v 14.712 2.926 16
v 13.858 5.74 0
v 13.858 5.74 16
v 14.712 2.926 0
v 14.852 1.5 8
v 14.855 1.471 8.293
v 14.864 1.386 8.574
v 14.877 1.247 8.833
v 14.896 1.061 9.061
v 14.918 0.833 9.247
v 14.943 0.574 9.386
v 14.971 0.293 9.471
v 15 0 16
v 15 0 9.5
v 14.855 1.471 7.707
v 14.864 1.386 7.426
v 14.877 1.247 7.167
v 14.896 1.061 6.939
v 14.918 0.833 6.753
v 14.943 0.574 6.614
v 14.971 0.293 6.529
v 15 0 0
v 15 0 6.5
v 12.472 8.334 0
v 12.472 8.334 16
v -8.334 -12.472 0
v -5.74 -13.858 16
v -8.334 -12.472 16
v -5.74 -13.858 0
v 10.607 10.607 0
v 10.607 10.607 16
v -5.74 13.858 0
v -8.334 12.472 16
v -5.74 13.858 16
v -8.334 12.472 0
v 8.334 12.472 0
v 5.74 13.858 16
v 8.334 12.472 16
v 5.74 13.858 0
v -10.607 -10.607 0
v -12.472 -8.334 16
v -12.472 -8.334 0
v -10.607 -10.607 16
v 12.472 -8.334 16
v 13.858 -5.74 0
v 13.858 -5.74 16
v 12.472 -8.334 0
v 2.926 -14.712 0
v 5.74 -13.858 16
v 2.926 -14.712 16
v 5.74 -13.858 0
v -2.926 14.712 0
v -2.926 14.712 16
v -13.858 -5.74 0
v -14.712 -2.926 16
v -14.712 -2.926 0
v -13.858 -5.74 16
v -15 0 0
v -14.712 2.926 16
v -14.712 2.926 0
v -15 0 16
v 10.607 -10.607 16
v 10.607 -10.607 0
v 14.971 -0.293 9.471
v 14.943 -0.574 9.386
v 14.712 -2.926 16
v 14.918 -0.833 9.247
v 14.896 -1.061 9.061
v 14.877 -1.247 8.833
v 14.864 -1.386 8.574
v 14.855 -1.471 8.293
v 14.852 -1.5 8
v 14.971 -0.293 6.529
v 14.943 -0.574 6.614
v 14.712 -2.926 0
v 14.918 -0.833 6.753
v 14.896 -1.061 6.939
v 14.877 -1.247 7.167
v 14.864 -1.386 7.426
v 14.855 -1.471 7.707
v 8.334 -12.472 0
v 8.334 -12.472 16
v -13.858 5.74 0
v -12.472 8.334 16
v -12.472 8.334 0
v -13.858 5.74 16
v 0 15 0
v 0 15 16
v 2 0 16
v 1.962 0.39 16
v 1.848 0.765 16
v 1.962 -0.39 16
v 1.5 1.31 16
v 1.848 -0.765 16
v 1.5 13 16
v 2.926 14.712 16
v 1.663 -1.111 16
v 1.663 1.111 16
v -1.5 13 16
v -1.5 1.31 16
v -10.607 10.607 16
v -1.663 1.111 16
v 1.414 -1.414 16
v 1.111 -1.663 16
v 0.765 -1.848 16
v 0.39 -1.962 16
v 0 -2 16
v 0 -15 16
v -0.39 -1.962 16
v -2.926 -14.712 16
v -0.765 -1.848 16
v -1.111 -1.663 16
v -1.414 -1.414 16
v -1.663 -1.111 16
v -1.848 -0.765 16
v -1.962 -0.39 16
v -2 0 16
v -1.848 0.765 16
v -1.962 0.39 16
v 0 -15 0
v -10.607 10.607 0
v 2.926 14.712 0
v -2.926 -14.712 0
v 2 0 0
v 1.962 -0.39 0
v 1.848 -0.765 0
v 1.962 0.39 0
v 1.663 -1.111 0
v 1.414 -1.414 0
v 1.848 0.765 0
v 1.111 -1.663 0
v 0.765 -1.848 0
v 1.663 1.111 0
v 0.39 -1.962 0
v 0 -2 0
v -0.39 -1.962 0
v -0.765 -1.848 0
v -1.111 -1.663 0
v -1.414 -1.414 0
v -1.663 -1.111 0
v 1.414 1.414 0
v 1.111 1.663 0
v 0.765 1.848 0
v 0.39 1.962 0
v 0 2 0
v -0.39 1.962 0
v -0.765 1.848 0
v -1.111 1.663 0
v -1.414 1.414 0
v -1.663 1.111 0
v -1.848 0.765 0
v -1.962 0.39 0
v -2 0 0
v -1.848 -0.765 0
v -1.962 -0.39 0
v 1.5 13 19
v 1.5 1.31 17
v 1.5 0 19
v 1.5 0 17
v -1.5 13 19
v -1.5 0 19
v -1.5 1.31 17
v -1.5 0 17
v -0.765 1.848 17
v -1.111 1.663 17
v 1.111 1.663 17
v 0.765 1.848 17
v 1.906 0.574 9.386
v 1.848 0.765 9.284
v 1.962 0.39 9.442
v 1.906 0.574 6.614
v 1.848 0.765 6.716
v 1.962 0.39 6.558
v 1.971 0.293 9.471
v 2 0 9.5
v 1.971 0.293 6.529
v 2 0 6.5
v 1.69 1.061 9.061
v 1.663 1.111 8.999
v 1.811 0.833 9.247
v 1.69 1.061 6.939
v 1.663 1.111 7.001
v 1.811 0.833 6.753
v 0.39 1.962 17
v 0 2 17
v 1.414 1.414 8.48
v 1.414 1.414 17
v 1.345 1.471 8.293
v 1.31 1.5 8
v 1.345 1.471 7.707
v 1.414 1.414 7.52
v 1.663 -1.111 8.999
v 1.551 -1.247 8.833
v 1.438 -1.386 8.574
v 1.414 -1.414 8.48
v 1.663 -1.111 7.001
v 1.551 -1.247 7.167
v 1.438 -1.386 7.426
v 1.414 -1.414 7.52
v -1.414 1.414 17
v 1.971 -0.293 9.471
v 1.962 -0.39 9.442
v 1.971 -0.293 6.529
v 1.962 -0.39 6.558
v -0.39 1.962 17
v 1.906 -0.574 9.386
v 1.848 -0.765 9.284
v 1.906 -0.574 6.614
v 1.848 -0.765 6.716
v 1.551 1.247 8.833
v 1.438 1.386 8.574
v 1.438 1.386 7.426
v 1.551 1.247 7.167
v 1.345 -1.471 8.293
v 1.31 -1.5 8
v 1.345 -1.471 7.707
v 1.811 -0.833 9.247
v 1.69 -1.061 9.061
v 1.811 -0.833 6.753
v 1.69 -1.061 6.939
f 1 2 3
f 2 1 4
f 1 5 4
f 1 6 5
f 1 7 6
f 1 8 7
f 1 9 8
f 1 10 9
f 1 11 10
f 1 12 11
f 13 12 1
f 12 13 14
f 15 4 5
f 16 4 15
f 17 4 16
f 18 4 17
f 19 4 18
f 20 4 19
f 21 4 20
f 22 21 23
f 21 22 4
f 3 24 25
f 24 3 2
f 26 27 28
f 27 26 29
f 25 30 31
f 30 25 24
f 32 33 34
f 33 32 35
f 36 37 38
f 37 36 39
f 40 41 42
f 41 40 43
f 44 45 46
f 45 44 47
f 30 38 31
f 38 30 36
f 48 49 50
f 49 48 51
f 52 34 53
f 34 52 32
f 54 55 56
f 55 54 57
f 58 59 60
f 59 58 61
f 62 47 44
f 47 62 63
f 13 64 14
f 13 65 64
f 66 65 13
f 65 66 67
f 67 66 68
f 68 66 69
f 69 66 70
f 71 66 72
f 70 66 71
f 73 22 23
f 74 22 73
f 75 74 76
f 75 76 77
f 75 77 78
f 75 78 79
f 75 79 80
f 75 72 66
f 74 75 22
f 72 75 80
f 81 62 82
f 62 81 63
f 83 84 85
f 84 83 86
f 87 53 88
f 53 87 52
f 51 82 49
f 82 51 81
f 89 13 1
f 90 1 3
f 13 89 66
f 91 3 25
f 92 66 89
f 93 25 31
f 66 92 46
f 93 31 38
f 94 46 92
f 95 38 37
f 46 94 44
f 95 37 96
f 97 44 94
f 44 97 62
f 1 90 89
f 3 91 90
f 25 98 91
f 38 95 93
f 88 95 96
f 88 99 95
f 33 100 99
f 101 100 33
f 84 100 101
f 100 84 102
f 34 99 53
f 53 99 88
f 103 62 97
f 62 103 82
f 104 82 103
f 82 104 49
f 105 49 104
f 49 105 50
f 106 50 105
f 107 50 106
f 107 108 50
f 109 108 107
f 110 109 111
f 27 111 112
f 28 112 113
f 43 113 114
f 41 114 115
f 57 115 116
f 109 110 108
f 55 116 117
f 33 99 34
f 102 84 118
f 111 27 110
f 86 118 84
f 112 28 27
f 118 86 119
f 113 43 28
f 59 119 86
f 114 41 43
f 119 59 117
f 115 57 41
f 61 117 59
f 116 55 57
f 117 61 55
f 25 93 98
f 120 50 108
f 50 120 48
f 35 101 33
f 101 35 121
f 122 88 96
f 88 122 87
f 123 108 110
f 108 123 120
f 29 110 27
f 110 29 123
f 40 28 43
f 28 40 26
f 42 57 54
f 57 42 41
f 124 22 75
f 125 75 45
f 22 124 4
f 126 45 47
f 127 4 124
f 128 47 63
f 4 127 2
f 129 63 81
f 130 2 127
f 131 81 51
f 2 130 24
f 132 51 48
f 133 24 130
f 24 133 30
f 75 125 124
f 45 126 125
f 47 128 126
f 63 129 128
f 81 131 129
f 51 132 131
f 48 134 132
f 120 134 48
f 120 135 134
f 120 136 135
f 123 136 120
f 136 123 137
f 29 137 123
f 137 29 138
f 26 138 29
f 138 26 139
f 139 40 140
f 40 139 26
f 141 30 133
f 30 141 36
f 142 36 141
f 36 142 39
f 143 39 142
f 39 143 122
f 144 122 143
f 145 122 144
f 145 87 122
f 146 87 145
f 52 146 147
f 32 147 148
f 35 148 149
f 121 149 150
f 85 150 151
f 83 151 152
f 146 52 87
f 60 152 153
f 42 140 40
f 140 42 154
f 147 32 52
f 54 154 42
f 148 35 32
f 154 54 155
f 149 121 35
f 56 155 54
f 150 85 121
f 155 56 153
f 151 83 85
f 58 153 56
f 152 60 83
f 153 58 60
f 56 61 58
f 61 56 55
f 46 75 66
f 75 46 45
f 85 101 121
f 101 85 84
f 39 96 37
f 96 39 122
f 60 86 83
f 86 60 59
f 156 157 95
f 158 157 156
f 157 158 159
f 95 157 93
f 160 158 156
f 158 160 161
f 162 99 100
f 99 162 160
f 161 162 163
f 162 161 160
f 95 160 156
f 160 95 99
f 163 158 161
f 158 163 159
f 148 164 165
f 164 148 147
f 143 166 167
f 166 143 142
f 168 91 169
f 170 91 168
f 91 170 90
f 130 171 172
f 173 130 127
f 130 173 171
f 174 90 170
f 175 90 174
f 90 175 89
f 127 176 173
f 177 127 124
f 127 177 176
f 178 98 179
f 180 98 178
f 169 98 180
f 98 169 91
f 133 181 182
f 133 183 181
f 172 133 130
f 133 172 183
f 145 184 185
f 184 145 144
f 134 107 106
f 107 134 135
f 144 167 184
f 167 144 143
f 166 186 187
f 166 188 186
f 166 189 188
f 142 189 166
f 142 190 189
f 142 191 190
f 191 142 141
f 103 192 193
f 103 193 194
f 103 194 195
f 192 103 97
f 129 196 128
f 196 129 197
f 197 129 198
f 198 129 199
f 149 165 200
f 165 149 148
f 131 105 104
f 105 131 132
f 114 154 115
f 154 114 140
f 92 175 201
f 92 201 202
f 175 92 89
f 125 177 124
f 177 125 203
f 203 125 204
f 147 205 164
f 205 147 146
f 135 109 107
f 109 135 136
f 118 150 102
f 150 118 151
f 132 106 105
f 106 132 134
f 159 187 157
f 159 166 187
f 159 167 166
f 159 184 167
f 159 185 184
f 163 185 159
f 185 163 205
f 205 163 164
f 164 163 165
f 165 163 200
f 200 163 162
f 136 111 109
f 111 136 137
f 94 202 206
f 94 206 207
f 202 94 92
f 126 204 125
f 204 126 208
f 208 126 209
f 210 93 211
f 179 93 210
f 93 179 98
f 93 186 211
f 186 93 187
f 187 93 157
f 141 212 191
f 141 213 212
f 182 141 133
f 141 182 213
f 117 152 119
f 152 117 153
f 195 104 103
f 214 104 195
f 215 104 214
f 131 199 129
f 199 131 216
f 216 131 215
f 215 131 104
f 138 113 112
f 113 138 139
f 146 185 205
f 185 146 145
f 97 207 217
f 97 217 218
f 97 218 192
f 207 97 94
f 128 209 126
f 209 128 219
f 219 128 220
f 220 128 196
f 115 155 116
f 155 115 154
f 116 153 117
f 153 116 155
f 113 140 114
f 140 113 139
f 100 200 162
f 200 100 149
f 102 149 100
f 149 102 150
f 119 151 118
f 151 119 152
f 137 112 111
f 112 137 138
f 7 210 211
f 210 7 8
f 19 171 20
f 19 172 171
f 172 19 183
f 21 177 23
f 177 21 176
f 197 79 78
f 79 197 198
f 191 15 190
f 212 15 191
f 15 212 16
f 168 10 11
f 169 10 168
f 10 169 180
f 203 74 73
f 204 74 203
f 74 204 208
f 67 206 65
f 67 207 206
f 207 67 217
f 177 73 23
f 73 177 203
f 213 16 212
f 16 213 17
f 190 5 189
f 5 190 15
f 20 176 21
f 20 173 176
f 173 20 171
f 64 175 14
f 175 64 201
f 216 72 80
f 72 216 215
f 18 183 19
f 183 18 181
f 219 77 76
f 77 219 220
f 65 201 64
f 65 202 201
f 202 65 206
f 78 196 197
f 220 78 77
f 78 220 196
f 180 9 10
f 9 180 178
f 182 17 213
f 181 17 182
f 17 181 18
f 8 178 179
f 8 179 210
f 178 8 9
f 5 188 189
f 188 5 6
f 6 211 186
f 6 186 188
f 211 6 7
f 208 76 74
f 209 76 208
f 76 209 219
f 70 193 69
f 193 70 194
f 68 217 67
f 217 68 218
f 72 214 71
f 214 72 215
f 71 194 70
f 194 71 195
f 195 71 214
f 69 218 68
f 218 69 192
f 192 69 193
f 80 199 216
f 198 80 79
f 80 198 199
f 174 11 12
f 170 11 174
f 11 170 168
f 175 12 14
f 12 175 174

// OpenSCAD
$fn = 32;

// ----------------------------------------------------------------------
// Control knob: pointer knob
// ----------------------------------------------------------------------

// --- parameters (mm) ---
rib_w = 3;                // pointer rib width
rib_h = 4;                // pointer rib height
knob_d = 30;              // knob body diameter
knob_h = 16;              // knob body height
bore_d = 4;               // shaft bore diameter
set_d = 3;                // set screw bore diameter
fit_tol = 0.05;           // tolerance for press fits, mm
free_tol = 0.2;           // tolerance for clearance fits, mm

rib_poke = rib_h - 1;  // rib height above the top
total_h = knob_h + rib_h - 1;  // overall height

difference() {
  union() {
    cylinder(h = knob_h, d = knob_d);
    translate([-rib_w / 2, 0, knob_h - 1])
      cube([rib_w, knob_d / 2 - 2, rib_h]);
  }
  translate([0, 0, -1]) cylinder(h = knob_h + 2, d = bore_d);
  translate([-1, 0, knob_h / 2]) rotate([0, 90, 0])
    cylinder(h = knob_d / 2 + bore_d / 2 + 2, d = set_d);}
